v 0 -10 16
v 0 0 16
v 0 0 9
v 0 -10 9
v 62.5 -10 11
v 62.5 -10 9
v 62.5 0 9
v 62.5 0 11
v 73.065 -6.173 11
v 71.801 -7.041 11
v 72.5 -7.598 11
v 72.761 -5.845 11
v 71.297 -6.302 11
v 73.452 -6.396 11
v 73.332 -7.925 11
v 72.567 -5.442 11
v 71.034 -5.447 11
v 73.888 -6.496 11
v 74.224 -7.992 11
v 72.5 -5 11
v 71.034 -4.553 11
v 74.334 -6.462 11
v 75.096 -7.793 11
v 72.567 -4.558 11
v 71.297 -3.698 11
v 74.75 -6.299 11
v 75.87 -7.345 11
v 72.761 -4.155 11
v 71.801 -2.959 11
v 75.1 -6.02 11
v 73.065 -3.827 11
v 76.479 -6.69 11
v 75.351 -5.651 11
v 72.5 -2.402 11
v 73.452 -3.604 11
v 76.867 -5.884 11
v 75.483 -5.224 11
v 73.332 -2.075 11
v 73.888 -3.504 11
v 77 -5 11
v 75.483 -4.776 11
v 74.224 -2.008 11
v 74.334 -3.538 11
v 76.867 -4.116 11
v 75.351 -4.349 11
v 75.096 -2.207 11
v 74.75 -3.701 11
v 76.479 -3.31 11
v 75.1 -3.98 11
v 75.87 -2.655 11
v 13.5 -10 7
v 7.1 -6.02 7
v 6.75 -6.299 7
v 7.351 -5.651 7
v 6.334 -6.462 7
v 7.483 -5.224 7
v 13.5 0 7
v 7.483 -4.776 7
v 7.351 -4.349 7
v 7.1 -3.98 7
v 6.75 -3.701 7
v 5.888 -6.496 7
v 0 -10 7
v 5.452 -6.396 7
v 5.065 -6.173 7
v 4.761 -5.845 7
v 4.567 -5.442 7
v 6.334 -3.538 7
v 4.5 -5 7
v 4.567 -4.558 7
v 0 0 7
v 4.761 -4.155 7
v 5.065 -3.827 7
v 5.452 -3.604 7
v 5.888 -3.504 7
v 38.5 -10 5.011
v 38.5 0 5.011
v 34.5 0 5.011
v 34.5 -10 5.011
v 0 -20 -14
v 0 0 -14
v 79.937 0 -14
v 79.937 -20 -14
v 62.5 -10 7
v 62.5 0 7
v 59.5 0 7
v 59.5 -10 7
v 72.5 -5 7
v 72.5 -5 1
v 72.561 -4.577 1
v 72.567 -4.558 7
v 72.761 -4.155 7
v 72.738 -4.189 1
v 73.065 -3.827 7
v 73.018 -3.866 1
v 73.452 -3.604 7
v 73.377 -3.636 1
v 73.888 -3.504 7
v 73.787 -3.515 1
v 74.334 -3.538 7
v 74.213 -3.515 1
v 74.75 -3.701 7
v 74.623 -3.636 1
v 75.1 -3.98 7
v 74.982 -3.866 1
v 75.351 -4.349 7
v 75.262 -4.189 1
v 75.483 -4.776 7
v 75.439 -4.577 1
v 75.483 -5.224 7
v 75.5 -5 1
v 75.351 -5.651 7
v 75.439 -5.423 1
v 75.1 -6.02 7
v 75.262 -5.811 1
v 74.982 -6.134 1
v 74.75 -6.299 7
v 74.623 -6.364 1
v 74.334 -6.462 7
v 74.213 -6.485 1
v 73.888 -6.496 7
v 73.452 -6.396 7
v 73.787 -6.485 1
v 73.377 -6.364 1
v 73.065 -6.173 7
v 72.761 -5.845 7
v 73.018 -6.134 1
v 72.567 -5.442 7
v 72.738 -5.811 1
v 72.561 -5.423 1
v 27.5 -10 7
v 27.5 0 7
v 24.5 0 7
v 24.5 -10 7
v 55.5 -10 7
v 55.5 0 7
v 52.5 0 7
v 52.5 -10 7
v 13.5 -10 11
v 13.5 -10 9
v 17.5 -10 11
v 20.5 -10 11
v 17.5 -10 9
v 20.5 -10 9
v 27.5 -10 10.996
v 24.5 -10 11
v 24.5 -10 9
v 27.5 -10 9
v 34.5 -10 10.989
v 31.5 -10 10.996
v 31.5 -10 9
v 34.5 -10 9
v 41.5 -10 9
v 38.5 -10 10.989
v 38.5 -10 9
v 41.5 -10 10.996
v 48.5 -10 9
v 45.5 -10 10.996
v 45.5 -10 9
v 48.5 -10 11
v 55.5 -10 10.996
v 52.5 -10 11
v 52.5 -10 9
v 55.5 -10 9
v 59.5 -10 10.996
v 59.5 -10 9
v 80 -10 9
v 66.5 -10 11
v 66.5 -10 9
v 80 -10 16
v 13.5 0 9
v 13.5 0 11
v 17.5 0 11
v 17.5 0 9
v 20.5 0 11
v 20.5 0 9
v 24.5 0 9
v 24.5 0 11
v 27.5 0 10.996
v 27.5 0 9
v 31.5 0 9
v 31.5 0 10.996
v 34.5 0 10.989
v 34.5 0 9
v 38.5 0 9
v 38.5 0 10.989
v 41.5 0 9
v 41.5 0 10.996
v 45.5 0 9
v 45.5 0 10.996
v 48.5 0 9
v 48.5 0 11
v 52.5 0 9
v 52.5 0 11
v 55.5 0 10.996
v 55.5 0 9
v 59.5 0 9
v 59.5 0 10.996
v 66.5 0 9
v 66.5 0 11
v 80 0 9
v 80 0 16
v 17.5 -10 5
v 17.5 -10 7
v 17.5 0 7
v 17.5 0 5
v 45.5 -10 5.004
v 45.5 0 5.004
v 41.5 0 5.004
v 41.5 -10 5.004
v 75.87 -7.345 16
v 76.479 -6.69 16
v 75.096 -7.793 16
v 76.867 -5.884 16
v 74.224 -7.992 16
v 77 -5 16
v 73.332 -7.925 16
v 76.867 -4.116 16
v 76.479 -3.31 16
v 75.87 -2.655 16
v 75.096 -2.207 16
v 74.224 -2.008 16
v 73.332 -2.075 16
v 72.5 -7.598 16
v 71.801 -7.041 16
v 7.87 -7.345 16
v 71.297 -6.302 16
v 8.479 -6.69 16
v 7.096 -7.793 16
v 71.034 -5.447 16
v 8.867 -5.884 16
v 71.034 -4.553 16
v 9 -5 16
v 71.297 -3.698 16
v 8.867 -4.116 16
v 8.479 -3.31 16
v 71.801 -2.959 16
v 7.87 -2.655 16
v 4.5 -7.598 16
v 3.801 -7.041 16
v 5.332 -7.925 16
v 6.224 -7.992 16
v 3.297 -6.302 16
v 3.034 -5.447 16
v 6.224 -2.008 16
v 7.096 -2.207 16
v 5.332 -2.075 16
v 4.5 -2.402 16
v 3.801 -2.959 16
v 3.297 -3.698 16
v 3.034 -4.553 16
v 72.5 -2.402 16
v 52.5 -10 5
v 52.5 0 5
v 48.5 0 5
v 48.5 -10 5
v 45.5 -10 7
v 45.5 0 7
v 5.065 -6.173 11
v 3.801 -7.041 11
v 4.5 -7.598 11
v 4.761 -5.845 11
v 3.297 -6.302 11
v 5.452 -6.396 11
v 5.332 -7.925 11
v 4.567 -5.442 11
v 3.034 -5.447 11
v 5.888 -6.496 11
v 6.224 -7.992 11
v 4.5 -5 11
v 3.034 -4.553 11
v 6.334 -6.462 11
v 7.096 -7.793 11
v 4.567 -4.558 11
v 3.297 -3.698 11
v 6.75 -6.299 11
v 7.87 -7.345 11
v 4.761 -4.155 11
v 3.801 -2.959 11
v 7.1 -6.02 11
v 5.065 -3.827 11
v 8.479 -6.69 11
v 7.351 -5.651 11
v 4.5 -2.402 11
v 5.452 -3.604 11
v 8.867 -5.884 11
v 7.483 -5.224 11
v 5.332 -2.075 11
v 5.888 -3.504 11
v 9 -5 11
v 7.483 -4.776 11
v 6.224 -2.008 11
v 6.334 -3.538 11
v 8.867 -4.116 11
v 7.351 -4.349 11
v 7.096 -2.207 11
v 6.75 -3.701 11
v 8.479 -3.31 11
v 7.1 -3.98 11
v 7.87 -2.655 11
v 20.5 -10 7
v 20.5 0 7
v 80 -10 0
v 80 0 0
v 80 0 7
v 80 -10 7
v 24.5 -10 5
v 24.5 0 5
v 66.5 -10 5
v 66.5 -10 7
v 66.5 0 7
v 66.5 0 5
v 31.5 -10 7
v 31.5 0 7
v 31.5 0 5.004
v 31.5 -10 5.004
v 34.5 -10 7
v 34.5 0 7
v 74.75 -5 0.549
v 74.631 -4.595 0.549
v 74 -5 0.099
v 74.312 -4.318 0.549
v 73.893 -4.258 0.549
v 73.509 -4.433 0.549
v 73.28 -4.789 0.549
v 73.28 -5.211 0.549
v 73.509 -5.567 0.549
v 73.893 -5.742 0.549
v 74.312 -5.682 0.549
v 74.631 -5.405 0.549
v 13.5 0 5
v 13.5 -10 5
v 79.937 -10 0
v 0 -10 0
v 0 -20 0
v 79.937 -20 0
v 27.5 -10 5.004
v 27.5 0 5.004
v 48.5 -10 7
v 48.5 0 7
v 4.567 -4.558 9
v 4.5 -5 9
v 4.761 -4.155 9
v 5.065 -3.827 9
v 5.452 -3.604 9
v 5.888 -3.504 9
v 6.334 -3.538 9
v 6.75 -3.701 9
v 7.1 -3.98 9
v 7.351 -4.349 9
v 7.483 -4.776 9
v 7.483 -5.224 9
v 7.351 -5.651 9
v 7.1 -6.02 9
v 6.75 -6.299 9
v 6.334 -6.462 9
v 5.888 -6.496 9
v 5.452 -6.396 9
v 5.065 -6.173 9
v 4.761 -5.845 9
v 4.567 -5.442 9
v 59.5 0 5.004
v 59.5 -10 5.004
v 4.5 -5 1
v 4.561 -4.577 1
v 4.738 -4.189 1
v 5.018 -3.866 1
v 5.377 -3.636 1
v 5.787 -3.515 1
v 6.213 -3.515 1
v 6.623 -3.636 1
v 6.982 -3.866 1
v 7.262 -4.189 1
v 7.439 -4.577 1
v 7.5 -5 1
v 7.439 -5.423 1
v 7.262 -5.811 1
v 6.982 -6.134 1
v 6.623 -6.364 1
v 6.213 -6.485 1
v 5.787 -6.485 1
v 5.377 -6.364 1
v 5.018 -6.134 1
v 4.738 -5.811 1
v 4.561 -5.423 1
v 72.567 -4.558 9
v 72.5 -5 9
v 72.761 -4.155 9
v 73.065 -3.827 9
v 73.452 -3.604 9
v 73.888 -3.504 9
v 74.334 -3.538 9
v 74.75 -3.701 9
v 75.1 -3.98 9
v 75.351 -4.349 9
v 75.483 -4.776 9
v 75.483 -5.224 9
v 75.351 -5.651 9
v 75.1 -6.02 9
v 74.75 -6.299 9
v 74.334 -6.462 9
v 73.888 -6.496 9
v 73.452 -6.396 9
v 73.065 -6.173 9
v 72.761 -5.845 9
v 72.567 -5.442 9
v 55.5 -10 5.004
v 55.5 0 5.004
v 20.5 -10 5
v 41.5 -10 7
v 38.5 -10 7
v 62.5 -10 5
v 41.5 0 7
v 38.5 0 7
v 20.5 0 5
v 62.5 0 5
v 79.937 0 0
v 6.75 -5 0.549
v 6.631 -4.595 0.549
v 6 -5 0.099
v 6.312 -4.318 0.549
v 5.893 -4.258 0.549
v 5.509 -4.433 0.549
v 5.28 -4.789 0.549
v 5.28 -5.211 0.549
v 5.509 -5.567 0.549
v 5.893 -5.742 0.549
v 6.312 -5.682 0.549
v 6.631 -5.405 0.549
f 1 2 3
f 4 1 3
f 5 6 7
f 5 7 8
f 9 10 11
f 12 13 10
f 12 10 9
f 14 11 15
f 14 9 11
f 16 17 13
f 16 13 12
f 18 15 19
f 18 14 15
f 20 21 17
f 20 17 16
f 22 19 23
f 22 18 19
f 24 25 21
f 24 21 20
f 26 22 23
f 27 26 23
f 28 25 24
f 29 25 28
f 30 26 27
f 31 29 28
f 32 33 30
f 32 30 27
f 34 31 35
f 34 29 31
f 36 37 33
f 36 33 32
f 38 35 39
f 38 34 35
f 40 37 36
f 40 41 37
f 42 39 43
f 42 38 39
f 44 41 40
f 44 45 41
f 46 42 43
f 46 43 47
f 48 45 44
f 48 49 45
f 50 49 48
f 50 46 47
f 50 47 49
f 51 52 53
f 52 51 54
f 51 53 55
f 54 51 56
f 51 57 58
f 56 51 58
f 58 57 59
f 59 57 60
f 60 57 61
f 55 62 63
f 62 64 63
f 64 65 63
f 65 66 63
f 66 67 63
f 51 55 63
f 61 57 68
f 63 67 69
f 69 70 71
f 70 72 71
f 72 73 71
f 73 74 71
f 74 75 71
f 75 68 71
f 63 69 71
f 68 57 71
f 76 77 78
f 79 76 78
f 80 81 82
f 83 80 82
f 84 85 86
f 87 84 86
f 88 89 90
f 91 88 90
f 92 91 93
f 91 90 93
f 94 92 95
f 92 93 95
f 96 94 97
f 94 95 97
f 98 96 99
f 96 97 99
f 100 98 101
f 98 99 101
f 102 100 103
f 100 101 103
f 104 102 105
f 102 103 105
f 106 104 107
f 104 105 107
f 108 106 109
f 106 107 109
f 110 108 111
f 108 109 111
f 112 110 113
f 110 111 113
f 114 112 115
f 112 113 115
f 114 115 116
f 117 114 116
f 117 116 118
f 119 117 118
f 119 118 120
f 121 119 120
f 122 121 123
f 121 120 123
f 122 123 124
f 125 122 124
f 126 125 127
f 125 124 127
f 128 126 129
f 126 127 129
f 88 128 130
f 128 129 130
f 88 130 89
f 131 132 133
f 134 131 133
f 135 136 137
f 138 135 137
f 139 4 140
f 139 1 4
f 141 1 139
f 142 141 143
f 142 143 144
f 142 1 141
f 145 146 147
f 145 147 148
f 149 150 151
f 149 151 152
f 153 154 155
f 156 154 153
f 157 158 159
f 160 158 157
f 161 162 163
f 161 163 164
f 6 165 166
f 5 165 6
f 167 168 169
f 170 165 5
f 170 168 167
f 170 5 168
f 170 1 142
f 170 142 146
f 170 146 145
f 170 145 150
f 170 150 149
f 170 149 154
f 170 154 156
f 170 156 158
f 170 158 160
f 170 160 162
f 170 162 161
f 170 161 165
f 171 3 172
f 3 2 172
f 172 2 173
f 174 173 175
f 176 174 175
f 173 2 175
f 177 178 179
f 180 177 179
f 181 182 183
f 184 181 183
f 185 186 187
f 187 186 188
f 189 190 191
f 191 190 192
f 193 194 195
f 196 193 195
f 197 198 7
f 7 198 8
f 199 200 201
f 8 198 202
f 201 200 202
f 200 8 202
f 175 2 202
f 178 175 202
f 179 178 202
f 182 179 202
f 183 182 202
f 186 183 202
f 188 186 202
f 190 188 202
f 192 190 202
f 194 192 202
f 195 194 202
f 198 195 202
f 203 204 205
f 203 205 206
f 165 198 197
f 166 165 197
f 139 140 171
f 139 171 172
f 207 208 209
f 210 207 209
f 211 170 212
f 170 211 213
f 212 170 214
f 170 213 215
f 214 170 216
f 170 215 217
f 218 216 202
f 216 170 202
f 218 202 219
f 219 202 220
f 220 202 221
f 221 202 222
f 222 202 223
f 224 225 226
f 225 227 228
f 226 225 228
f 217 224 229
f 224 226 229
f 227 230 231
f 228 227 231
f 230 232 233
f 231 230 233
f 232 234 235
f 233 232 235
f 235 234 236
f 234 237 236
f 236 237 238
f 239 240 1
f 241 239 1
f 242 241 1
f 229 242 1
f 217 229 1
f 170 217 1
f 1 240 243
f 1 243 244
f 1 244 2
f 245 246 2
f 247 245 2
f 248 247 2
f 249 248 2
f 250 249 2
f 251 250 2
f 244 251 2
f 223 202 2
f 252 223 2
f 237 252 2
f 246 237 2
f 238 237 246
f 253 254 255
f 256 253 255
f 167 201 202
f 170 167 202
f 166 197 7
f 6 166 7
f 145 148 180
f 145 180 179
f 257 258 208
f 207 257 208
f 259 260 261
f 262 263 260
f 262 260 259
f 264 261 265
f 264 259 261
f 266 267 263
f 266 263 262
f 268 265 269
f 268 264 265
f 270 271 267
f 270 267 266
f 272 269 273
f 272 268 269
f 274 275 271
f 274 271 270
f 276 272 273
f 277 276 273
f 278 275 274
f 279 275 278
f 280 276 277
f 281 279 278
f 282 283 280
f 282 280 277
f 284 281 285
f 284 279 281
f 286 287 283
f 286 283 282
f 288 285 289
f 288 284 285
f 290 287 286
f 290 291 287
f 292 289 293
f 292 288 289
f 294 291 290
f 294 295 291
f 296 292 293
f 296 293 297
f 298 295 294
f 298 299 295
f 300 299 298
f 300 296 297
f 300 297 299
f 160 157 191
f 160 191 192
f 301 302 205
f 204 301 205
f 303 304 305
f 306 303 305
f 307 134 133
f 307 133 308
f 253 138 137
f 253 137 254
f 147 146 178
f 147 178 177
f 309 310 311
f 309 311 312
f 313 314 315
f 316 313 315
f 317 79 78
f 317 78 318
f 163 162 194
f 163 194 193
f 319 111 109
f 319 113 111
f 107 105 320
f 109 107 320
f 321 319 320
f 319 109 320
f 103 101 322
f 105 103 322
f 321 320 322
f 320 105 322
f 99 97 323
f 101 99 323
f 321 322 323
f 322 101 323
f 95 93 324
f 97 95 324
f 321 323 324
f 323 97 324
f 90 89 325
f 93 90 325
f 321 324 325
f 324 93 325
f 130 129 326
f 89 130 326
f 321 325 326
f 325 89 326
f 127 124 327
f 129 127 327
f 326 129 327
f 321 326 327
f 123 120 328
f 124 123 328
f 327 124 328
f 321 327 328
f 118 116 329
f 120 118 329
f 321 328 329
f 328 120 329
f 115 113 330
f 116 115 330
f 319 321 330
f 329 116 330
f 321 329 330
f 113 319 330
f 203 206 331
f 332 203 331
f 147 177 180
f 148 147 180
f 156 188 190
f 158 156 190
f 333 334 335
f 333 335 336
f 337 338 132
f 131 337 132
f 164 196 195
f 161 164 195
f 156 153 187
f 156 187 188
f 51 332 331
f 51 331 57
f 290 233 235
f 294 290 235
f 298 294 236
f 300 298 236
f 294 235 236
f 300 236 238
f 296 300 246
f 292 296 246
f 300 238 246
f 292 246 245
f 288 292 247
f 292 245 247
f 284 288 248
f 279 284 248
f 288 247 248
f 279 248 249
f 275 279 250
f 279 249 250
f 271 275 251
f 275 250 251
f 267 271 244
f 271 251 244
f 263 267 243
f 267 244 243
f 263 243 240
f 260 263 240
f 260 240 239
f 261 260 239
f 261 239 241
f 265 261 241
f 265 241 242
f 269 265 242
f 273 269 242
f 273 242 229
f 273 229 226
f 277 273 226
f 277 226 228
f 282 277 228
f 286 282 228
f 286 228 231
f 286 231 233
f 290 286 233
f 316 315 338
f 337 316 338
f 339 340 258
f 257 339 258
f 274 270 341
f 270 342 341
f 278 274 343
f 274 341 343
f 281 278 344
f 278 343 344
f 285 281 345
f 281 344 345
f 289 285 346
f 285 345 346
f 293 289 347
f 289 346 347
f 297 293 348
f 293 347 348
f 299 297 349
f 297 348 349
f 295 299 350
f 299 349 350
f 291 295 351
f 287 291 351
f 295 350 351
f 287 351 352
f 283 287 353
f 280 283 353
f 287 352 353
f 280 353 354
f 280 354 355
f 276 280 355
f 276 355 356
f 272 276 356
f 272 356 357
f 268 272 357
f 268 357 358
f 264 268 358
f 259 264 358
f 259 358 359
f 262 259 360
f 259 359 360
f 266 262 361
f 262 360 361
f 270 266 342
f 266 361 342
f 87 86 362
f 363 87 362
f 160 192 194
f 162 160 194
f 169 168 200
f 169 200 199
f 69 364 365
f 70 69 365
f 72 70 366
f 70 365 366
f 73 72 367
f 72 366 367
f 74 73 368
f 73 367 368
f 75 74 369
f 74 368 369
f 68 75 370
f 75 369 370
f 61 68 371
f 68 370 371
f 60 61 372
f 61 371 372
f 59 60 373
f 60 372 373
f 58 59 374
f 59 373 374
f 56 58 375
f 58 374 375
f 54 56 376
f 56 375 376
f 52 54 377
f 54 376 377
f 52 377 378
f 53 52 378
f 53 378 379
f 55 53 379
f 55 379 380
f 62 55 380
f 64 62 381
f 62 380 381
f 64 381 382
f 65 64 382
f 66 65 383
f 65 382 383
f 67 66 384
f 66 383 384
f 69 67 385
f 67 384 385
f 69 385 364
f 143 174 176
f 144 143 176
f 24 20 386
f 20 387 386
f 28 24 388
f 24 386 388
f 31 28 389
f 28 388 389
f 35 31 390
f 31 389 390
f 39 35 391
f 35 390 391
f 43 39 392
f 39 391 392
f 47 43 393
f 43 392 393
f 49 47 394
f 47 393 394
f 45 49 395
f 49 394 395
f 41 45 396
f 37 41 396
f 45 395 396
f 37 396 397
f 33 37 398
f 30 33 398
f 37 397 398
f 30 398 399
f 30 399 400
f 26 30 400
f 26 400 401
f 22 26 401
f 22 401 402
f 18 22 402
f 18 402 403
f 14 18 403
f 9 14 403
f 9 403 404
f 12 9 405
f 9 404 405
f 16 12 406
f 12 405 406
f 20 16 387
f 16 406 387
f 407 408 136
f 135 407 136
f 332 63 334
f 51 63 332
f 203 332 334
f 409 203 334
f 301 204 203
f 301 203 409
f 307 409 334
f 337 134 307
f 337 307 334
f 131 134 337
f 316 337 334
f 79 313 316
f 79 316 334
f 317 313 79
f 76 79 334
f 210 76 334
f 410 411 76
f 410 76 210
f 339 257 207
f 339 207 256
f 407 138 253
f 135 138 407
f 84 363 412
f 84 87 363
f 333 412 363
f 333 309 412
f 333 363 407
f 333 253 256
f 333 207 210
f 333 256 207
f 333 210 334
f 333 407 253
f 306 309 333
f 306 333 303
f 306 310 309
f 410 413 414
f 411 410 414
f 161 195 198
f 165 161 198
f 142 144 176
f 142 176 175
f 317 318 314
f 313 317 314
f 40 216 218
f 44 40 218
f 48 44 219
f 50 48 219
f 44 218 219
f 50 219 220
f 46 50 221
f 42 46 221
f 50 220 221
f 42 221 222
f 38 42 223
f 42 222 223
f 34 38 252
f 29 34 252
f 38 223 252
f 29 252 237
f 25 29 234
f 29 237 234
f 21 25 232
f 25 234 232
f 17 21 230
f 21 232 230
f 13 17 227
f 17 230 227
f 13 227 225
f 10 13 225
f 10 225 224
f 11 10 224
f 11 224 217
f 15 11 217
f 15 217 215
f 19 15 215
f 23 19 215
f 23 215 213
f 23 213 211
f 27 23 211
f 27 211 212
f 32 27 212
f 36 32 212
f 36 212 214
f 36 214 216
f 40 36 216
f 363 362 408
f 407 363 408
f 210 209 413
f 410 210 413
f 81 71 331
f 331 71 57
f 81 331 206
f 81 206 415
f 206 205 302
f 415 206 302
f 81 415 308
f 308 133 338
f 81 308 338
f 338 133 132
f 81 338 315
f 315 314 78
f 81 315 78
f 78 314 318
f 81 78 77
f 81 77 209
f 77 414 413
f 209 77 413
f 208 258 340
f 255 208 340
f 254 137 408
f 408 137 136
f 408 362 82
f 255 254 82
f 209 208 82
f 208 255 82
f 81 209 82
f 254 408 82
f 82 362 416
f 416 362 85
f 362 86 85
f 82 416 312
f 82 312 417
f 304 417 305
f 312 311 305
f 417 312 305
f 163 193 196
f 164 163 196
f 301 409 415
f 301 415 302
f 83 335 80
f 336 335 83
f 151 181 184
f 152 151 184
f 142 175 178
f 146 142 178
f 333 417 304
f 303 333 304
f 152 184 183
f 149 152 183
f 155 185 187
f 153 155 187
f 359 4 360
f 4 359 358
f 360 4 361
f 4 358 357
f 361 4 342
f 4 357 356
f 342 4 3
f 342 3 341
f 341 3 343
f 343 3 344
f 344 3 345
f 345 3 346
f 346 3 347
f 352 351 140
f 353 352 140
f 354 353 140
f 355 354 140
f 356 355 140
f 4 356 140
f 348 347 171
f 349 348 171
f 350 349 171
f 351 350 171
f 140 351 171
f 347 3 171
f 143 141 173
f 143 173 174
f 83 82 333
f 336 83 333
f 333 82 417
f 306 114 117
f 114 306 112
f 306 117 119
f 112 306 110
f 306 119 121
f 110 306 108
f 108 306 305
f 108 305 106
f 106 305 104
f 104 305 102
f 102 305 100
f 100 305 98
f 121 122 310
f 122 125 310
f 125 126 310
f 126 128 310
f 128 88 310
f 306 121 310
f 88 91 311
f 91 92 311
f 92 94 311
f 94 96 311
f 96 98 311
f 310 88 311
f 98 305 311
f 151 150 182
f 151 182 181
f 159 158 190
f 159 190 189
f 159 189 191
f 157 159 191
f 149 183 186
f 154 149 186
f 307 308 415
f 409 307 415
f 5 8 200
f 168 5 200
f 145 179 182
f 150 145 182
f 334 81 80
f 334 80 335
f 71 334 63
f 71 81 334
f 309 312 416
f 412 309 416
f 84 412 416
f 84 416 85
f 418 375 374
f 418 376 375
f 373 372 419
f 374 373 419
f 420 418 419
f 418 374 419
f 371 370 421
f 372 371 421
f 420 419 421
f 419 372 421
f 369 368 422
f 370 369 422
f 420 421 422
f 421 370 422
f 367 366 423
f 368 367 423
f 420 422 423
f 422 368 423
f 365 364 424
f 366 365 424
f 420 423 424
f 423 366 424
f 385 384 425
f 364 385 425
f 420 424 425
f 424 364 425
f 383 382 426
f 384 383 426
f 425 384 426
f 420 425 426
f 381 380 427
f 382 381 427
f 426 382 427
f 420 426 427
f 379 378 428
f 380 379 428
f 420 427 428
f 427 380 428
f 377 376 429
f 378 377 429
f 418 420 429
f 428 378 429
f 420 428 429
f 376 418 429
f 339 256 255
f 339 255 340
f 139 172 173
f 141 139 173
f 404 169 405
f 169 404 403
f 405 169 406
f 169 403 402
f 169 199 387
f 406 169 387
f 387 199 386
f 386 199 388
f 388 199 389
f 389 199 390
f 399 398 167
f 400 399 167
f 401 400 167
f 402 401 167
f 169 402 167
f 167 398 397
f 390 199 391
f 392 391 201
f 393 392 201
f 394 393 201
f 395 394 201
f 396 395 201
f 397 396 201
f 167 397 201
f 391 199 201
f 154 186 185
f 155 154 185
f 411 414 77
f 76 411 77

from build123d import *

# Parameters (mm, degrees)
F1_DEPTH         = 10
F3_D             = 3
F3_DEPTH         = 15
F3_CBORE_D       = 6
F3_CBORE_DEPTH   = 5
F3_TIP           = 0.9012909285
F3_2_D           = 3
F3_2_DEPTH       = 15
F3_2_CBORE_D     = 6
F3_2_CBORE_DEPTH = 5
F3_2_TIP         = 0.9012909285
F0_W             = 79.936705776
F0_H             = 13.9998569222
F4_DEPTH         = 20


with BuildPart() as f1:
    # F0 (on Front) → F1 (new body)
    with BuildSketch(Plane.XZ):
        Polygon((0, 9), (13.5, 9), (13.5, 11), (17.5, 11), (17.5, 9), (20.5, 9), (20.5, 11), (24.5, 11), (24.5, 9), (27.5, 9), (27.5, 10.9958891446), (31.5, 10.9958891446), (31.5, 9), (34.5, 9), (34.5, 10.9885419408), (38.5, 10.9885419408), (38.5, 9), (41.5, 9), (41.5, 10.9958891446), (45.5, 10.9958891446), (45.5, 9), (48.5, 9), (48.5, 11), (52.5, 11), (52.5, 9), (55.5, 9), (55.5, 10.9961733073), (59.5, 10.9961733073), (59.5, 9), (62.5, 9), (62.5, 11), (66.5, 11), (66.5, 9), (80, 9), (80, 16), (0, 16), align=None)
    extrude(amount=F1_DEPTH)

    # F3
    with Locations(Plane.XY.offset(16)):
        with Locations((6, -5), (74, -5)):
            CounterBoreHole(F3_D / 2, F3_CBORE_D / 2, F3_CBORE_DEPTH, depth=F3_DEPTH)
            with Locations((0, 0, -(F3_DEPTH + F3_TIP / 2))):  # 118° drill point
                Cone(0, F3_D / 2, F3_TIP, mode=Mode.SUBTRACT)


with BuildPart() as f1b:
    # F0 (on Front) → F1, piece 2 (new body)
    with BuildSketch(Plane.XZ):
        Polygon((0, 7), (0, 0), (79.936705776, 0), (80, 0), (80, 7), (66.5, 7), (66.5, 5), (62.5, 5), (62.5, 7), (59.5, 7), (59.5, 5.0038266927), (55.5, 5.0038266927), (55.5, 7), (52.5, 7), (52.5, 5), (48.5, 5), (48.5, 7), (45.5, 7), (45.5, 5.0041108554), (41.5, 5.0041108554), (41.5, 7), (38.5, 7), (38.5, 5.0114580592), (34.5, 5.0114580592), (34.5, 7), (31.5, 7), (31.5, 5.0041108554), (27.5, 5.0041108554), (27.5, 7), (24.5, 7), (24.5, 5), (20.5, 5), (20.5, 7), (17.5, 7), (17.5, 5), (13.5, 5), (13.5, 7), align=None)
    extrude(amount=F1_DEPTH)

    # F3#2
    with Locations(Plane.XY.offset(16)):
        with Locations((6, -5), (74, -5)):
            CounterBoreHole(F3_2_D / 2, F3_2_CBORE_D / 2, F3_2_CBORE_DEPTH, depth=F3_2_DEPTH)
            with Locations((0, 0, -(F3_2_DEPTH + F3_2_TIP / 2))):  # 118° drill point
                Cone(0, F3_2_D / 2, F3_2_TIP, mode=Mode.SUBTRACT)

    # F0 (on Front) → F4 (join)
    with BuildSketch(Plane.XZ):
        with Locations((39.968352888, -6.9999284611)):
            Rectangle(F0_W, F0_H)
    extrude(amount=F4_DEPTH)


solid = Compound([f1.part, f1b.part])
